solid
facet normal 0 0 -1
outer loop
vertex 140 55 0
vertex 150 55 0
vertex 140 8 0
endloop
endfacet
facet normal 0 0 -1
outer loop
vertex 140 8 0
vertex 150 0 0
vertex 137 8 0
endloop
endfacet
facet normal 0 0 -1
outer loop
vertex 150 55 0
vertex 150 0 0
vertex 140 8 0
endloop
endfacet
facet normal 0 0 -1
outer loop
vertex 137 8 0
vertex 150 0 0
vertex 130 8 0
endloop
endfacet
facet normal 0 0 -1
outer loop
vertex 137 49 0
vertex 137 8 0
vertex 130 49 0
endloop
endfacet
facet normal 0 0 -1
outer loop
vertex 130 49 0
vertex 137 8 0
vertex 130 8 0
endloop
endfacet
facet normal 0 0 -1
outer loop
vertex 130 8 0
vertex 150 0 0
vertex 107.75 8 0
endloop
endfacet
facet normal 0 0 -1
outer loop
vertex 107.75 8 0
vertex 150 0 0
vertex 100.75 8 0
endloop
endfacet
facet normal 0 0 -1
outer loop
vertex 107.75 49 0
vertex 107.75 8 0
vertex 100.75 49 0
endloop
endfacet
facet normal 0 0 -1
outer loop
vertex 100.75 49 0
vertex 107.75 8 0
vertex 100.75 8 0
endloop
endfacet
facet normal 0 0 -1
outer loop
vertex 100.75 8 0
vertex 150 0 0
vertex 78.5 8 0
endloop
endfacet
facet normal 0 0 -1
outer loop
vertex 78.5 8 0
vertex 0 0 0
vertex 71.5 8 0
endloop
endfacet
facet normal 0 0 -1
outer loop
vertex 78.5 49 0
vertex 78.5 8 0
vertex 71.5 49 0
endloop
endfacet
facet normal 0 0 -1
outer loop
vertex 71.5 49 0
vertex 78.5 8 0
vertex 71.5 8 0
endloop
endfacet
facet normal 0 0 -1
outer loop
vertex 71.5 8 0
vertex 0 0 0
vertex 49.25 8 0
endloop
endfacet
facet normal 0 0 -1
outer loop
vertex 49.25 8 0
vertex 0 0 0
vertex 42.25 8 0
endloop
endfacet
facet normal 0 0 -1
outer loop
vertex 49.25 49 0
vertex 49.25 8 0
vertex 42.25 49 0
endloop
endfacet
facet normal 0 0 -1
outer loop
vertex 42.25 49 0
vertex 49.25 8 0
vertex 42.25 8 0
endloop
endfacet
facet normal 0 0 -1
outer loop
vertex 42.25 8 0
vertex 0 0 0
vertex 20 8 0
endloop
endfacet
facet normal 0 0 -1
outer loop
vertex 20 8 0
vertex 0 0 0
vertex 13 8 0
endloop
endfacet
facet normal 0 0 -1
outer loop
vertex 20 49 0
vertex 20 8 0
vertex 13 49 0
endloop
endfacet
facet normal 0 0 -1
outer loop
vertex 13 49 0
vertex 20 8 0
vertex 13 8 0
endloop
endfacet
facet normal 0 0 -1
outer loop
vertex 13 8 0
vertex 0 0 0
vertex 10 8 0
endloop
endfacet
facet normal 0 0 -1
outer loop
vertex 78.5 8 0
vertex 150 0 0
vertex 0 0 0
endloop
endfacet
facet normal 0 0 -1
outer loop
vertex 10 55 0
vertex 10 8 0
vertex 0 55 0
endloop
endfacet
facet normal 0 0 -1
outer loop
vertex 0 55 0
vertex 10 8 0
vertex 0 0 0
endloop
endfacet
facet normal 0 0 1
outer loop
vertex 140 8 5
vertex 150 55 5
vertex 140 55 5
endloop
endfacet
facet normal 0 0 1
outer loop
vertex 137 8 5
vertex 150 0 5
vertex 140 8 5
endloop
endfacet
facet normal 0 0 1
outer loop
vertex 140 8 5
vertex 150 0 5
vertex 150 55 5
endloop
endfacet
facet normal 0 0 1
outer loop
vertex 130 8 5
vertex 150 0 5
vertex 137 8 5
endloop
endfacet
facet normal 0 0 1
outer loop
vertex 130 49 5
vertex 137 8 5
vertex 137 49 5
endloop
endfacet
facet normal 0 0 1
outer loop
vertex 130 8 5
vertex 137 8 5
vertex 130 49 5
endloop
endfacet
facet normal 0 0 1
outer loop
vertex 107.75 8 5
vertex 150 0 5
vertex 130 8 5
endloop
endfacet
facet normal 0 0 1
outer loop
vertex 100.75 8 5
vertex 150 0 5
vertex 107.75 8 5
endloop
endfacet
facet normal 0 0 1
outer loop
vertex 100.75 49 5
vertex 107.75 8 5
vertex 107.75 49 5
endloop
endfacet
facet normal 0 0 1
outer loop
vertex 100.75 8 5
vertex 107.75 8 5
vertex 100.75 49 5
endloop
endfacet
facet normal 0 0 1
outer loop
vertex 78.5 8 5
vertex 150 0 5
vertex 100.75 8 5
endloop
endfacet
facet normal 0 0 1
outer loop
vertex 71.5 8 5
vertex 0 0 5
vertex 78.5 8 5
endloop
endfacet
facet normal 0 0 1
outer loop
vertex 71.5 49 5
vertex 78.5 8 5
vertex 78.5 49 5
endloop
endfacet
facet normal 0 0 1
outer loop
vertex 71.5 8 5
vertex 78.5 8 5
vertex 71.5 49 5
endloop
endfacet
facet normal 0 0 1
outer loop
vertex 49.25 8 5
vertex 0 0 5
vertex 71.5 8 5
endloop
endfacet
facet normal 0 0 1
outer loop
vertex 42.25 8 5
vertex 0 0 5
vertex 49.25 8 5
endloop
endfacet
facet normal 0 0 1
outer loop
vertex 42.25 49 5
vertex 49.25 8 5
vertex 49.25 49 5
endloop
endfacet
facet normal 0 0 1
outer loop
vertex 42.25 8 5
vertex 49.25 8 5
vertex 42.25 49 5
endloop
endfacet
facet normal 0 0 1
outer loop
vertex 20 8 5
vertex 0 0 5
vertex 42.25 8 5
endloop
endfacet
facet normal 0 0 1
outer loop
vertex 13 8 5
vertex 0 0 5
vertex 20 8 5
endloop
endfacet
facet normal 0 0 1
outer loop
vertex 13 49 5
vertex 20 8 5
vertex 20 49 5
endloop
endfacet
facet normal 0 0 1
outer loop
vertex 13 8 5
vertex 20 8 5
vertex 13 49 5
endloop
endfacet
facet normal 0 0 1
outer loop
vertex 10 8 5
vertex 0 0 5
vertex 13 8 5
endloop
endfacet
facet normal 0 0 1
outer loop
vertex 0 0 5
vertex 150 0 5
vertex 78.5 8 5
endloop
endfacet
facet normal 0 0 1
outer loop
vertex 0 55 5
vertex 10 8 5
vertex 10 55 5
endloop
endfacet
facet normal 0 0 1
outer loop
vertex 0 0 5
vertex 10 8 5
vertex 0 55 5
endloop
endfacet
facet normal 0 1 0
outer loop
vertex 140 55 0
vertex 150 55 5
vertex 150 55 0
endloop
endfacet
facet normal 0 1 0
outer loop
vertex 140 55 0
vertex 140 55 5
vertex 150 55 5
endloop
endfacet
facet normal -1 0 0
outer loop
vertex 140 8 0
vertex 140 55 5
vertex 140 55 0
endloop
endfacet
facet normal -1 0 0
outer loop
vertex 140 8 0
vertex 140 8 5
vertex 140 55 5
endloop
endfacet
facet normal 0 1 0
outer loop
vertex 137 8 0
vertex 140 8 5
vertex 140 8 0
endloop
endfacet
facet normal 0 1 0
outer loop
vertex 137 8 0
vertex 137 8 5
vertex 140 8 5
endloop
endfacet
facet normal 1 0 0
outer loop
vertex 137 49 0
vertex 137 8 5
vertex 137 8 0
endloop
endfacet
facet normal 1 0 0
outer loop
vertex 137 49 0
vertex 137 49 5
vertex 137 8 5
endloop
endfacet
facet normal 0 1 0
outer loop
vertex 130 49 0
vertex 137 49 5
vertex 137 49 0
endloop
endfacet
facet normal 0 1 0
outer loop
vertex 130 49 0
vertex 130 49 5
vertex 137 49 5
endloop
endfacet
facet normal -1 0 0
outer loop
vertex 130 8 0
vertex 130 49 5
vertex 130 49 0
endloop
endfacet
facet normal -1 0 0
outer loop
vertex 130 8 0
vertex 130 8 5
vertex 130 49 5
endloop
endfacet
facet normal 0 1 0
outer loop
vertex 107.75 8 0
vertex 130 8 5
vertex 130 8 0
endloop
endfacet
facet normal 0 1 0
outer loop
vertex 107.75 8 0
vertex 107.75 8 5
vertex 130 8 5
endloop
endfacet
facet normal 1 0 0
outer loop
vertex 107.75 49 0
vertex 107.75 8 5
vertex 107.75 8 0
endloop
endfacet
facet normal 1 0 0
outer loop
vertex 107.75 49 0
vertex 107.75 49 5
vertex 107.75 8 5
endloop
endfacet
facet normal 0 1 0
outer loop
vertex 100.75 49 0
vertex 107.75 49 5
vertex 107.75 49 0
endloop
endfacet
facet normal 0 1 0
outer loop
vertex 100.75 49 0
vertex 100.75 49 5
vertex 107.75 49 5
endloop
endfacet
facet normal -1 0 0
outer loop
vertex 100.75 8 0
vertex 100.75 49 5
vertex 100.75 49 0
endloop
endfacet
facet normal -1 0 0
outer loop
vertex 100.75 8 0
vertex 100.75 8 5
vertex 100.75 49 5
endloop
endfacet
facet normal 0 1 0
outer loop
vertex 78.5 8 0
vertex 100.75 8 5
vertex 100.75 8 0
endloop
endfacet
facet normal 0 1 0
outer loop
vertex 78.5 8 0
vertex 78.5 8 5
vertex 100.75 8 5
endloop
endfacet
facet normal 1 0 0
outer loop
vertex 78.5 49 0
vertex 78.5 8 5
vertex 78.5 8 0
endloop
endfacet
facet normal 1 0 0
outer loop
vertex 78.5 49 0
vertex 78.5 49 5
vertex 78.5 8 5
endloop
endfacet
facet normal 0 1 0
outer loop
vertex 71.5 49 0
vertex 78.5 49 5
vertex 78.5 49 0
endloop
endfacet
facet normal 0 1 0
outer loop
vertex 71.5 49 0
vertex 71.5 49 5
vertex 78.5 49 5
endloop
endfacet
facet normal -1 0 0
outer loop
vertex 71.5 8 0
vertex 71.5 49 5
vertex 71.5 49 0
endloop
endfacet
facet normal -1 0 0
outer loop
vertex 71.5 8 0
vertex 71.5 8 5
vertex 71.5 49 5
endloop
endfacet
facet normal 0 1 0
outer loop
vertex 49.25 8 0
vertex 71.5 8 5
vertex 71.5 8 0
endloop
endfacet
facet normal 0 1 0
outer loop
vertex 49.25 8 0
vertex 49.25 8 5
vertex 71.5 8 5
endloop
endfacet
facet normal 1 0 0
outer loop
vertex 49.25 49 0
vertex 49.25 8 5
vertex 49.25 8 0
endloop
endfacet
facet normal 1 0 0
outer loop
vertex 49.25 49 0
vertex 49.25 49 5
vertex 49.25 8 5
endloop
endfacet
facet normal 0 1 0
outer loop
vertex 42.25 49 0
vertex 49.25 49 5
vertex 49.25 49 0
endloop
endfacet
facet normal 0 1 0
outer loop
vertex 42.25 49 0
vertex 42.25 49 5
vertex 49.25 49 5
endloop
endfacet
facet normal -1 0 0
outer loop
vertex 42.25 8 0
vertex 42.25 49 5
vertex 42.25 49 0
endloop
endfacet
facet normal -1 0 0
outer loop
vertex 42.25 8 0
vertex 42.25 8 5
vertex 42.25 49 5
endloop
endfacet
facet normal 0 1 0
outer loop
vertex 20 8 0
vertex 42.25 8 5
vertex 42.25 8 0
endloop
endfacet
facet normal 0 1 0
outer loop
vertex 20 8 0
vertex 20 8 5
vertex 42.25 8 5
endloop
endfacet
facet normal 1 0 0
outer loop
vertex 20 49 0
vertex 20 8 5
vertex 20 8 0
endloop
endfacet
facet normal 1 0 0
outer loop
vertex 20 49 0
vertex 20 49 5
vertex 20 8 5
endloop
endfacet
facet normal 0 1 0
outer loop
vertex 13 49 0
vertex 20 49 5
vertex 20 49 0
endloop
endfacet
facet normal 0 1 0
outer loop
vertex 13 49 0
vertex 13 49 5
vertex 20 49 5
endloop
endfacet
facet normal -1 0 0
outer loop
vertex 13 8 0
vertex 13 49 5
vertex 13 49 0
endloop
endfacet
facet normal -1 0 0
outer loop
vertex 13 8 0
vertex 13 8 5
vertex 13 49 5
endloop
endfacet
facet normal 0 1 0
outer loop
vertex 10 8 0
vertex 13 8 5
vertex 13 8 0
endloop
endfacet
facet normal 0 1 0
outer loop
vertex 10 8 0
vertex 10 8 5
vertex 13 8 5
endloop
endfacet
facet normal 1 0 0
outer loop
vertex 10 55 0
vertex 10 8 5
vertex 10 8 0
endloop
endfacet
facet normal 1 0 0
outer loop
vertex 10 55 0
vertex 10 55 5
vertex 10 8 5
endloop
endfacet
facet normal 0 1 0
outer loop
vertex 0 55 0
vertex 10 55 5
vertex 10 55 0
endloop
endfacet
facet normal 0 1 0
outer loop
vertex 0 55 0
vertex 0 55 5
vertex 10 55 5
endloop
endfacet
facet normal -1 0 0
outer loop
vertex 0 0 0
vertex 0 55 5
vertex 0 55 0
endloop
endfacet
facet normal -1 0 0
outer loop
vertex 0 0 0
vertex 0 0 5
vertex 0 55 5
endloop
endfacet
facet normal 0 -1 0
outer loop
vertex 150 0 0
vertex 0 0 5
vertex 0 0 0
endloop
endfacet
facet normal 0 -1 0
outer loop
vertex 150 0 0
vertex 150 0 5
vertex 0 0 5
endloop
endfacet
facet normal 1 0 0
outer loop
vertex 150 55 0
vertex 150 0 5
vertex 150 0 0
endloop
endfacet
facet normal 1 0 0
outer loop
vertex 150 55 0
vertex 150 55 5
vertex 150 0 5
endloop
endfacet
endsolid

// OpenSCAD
$fn = 32;

// ----------------------------------------------------------------------
// Guard grille: 5 slats over a 150 x 55 mm plate
// ----------------------------------------------------------------------

// --- parameters (mm) ---
profile_height = 5;       // extrusion height
profile_points = 28;      // points of the closed outline

profile = [[0, 0], [150, 0], [150, 55], [140, 55], [140, 8], [137, 8], [137, 49], [130, 49], [130, 8], [107.75, 8], [107.75, 49], [100.75, 49], [100.75, 8], [78.5, 8], [78.5, 49], [71.5, 49], [71.5, 8], [49.25, 8], [49.25, 49], [42.25, 49], [42.25, 8], [20, 8], [20, 49], [13, 49], [13, 8], [10, 8], [10, 55], [0, 55]];  // single closed polygon, 28 points, counter clockwise

// --- the one profile operation ---
linear_extrude(height = profile_height) polygon(points = profile);
